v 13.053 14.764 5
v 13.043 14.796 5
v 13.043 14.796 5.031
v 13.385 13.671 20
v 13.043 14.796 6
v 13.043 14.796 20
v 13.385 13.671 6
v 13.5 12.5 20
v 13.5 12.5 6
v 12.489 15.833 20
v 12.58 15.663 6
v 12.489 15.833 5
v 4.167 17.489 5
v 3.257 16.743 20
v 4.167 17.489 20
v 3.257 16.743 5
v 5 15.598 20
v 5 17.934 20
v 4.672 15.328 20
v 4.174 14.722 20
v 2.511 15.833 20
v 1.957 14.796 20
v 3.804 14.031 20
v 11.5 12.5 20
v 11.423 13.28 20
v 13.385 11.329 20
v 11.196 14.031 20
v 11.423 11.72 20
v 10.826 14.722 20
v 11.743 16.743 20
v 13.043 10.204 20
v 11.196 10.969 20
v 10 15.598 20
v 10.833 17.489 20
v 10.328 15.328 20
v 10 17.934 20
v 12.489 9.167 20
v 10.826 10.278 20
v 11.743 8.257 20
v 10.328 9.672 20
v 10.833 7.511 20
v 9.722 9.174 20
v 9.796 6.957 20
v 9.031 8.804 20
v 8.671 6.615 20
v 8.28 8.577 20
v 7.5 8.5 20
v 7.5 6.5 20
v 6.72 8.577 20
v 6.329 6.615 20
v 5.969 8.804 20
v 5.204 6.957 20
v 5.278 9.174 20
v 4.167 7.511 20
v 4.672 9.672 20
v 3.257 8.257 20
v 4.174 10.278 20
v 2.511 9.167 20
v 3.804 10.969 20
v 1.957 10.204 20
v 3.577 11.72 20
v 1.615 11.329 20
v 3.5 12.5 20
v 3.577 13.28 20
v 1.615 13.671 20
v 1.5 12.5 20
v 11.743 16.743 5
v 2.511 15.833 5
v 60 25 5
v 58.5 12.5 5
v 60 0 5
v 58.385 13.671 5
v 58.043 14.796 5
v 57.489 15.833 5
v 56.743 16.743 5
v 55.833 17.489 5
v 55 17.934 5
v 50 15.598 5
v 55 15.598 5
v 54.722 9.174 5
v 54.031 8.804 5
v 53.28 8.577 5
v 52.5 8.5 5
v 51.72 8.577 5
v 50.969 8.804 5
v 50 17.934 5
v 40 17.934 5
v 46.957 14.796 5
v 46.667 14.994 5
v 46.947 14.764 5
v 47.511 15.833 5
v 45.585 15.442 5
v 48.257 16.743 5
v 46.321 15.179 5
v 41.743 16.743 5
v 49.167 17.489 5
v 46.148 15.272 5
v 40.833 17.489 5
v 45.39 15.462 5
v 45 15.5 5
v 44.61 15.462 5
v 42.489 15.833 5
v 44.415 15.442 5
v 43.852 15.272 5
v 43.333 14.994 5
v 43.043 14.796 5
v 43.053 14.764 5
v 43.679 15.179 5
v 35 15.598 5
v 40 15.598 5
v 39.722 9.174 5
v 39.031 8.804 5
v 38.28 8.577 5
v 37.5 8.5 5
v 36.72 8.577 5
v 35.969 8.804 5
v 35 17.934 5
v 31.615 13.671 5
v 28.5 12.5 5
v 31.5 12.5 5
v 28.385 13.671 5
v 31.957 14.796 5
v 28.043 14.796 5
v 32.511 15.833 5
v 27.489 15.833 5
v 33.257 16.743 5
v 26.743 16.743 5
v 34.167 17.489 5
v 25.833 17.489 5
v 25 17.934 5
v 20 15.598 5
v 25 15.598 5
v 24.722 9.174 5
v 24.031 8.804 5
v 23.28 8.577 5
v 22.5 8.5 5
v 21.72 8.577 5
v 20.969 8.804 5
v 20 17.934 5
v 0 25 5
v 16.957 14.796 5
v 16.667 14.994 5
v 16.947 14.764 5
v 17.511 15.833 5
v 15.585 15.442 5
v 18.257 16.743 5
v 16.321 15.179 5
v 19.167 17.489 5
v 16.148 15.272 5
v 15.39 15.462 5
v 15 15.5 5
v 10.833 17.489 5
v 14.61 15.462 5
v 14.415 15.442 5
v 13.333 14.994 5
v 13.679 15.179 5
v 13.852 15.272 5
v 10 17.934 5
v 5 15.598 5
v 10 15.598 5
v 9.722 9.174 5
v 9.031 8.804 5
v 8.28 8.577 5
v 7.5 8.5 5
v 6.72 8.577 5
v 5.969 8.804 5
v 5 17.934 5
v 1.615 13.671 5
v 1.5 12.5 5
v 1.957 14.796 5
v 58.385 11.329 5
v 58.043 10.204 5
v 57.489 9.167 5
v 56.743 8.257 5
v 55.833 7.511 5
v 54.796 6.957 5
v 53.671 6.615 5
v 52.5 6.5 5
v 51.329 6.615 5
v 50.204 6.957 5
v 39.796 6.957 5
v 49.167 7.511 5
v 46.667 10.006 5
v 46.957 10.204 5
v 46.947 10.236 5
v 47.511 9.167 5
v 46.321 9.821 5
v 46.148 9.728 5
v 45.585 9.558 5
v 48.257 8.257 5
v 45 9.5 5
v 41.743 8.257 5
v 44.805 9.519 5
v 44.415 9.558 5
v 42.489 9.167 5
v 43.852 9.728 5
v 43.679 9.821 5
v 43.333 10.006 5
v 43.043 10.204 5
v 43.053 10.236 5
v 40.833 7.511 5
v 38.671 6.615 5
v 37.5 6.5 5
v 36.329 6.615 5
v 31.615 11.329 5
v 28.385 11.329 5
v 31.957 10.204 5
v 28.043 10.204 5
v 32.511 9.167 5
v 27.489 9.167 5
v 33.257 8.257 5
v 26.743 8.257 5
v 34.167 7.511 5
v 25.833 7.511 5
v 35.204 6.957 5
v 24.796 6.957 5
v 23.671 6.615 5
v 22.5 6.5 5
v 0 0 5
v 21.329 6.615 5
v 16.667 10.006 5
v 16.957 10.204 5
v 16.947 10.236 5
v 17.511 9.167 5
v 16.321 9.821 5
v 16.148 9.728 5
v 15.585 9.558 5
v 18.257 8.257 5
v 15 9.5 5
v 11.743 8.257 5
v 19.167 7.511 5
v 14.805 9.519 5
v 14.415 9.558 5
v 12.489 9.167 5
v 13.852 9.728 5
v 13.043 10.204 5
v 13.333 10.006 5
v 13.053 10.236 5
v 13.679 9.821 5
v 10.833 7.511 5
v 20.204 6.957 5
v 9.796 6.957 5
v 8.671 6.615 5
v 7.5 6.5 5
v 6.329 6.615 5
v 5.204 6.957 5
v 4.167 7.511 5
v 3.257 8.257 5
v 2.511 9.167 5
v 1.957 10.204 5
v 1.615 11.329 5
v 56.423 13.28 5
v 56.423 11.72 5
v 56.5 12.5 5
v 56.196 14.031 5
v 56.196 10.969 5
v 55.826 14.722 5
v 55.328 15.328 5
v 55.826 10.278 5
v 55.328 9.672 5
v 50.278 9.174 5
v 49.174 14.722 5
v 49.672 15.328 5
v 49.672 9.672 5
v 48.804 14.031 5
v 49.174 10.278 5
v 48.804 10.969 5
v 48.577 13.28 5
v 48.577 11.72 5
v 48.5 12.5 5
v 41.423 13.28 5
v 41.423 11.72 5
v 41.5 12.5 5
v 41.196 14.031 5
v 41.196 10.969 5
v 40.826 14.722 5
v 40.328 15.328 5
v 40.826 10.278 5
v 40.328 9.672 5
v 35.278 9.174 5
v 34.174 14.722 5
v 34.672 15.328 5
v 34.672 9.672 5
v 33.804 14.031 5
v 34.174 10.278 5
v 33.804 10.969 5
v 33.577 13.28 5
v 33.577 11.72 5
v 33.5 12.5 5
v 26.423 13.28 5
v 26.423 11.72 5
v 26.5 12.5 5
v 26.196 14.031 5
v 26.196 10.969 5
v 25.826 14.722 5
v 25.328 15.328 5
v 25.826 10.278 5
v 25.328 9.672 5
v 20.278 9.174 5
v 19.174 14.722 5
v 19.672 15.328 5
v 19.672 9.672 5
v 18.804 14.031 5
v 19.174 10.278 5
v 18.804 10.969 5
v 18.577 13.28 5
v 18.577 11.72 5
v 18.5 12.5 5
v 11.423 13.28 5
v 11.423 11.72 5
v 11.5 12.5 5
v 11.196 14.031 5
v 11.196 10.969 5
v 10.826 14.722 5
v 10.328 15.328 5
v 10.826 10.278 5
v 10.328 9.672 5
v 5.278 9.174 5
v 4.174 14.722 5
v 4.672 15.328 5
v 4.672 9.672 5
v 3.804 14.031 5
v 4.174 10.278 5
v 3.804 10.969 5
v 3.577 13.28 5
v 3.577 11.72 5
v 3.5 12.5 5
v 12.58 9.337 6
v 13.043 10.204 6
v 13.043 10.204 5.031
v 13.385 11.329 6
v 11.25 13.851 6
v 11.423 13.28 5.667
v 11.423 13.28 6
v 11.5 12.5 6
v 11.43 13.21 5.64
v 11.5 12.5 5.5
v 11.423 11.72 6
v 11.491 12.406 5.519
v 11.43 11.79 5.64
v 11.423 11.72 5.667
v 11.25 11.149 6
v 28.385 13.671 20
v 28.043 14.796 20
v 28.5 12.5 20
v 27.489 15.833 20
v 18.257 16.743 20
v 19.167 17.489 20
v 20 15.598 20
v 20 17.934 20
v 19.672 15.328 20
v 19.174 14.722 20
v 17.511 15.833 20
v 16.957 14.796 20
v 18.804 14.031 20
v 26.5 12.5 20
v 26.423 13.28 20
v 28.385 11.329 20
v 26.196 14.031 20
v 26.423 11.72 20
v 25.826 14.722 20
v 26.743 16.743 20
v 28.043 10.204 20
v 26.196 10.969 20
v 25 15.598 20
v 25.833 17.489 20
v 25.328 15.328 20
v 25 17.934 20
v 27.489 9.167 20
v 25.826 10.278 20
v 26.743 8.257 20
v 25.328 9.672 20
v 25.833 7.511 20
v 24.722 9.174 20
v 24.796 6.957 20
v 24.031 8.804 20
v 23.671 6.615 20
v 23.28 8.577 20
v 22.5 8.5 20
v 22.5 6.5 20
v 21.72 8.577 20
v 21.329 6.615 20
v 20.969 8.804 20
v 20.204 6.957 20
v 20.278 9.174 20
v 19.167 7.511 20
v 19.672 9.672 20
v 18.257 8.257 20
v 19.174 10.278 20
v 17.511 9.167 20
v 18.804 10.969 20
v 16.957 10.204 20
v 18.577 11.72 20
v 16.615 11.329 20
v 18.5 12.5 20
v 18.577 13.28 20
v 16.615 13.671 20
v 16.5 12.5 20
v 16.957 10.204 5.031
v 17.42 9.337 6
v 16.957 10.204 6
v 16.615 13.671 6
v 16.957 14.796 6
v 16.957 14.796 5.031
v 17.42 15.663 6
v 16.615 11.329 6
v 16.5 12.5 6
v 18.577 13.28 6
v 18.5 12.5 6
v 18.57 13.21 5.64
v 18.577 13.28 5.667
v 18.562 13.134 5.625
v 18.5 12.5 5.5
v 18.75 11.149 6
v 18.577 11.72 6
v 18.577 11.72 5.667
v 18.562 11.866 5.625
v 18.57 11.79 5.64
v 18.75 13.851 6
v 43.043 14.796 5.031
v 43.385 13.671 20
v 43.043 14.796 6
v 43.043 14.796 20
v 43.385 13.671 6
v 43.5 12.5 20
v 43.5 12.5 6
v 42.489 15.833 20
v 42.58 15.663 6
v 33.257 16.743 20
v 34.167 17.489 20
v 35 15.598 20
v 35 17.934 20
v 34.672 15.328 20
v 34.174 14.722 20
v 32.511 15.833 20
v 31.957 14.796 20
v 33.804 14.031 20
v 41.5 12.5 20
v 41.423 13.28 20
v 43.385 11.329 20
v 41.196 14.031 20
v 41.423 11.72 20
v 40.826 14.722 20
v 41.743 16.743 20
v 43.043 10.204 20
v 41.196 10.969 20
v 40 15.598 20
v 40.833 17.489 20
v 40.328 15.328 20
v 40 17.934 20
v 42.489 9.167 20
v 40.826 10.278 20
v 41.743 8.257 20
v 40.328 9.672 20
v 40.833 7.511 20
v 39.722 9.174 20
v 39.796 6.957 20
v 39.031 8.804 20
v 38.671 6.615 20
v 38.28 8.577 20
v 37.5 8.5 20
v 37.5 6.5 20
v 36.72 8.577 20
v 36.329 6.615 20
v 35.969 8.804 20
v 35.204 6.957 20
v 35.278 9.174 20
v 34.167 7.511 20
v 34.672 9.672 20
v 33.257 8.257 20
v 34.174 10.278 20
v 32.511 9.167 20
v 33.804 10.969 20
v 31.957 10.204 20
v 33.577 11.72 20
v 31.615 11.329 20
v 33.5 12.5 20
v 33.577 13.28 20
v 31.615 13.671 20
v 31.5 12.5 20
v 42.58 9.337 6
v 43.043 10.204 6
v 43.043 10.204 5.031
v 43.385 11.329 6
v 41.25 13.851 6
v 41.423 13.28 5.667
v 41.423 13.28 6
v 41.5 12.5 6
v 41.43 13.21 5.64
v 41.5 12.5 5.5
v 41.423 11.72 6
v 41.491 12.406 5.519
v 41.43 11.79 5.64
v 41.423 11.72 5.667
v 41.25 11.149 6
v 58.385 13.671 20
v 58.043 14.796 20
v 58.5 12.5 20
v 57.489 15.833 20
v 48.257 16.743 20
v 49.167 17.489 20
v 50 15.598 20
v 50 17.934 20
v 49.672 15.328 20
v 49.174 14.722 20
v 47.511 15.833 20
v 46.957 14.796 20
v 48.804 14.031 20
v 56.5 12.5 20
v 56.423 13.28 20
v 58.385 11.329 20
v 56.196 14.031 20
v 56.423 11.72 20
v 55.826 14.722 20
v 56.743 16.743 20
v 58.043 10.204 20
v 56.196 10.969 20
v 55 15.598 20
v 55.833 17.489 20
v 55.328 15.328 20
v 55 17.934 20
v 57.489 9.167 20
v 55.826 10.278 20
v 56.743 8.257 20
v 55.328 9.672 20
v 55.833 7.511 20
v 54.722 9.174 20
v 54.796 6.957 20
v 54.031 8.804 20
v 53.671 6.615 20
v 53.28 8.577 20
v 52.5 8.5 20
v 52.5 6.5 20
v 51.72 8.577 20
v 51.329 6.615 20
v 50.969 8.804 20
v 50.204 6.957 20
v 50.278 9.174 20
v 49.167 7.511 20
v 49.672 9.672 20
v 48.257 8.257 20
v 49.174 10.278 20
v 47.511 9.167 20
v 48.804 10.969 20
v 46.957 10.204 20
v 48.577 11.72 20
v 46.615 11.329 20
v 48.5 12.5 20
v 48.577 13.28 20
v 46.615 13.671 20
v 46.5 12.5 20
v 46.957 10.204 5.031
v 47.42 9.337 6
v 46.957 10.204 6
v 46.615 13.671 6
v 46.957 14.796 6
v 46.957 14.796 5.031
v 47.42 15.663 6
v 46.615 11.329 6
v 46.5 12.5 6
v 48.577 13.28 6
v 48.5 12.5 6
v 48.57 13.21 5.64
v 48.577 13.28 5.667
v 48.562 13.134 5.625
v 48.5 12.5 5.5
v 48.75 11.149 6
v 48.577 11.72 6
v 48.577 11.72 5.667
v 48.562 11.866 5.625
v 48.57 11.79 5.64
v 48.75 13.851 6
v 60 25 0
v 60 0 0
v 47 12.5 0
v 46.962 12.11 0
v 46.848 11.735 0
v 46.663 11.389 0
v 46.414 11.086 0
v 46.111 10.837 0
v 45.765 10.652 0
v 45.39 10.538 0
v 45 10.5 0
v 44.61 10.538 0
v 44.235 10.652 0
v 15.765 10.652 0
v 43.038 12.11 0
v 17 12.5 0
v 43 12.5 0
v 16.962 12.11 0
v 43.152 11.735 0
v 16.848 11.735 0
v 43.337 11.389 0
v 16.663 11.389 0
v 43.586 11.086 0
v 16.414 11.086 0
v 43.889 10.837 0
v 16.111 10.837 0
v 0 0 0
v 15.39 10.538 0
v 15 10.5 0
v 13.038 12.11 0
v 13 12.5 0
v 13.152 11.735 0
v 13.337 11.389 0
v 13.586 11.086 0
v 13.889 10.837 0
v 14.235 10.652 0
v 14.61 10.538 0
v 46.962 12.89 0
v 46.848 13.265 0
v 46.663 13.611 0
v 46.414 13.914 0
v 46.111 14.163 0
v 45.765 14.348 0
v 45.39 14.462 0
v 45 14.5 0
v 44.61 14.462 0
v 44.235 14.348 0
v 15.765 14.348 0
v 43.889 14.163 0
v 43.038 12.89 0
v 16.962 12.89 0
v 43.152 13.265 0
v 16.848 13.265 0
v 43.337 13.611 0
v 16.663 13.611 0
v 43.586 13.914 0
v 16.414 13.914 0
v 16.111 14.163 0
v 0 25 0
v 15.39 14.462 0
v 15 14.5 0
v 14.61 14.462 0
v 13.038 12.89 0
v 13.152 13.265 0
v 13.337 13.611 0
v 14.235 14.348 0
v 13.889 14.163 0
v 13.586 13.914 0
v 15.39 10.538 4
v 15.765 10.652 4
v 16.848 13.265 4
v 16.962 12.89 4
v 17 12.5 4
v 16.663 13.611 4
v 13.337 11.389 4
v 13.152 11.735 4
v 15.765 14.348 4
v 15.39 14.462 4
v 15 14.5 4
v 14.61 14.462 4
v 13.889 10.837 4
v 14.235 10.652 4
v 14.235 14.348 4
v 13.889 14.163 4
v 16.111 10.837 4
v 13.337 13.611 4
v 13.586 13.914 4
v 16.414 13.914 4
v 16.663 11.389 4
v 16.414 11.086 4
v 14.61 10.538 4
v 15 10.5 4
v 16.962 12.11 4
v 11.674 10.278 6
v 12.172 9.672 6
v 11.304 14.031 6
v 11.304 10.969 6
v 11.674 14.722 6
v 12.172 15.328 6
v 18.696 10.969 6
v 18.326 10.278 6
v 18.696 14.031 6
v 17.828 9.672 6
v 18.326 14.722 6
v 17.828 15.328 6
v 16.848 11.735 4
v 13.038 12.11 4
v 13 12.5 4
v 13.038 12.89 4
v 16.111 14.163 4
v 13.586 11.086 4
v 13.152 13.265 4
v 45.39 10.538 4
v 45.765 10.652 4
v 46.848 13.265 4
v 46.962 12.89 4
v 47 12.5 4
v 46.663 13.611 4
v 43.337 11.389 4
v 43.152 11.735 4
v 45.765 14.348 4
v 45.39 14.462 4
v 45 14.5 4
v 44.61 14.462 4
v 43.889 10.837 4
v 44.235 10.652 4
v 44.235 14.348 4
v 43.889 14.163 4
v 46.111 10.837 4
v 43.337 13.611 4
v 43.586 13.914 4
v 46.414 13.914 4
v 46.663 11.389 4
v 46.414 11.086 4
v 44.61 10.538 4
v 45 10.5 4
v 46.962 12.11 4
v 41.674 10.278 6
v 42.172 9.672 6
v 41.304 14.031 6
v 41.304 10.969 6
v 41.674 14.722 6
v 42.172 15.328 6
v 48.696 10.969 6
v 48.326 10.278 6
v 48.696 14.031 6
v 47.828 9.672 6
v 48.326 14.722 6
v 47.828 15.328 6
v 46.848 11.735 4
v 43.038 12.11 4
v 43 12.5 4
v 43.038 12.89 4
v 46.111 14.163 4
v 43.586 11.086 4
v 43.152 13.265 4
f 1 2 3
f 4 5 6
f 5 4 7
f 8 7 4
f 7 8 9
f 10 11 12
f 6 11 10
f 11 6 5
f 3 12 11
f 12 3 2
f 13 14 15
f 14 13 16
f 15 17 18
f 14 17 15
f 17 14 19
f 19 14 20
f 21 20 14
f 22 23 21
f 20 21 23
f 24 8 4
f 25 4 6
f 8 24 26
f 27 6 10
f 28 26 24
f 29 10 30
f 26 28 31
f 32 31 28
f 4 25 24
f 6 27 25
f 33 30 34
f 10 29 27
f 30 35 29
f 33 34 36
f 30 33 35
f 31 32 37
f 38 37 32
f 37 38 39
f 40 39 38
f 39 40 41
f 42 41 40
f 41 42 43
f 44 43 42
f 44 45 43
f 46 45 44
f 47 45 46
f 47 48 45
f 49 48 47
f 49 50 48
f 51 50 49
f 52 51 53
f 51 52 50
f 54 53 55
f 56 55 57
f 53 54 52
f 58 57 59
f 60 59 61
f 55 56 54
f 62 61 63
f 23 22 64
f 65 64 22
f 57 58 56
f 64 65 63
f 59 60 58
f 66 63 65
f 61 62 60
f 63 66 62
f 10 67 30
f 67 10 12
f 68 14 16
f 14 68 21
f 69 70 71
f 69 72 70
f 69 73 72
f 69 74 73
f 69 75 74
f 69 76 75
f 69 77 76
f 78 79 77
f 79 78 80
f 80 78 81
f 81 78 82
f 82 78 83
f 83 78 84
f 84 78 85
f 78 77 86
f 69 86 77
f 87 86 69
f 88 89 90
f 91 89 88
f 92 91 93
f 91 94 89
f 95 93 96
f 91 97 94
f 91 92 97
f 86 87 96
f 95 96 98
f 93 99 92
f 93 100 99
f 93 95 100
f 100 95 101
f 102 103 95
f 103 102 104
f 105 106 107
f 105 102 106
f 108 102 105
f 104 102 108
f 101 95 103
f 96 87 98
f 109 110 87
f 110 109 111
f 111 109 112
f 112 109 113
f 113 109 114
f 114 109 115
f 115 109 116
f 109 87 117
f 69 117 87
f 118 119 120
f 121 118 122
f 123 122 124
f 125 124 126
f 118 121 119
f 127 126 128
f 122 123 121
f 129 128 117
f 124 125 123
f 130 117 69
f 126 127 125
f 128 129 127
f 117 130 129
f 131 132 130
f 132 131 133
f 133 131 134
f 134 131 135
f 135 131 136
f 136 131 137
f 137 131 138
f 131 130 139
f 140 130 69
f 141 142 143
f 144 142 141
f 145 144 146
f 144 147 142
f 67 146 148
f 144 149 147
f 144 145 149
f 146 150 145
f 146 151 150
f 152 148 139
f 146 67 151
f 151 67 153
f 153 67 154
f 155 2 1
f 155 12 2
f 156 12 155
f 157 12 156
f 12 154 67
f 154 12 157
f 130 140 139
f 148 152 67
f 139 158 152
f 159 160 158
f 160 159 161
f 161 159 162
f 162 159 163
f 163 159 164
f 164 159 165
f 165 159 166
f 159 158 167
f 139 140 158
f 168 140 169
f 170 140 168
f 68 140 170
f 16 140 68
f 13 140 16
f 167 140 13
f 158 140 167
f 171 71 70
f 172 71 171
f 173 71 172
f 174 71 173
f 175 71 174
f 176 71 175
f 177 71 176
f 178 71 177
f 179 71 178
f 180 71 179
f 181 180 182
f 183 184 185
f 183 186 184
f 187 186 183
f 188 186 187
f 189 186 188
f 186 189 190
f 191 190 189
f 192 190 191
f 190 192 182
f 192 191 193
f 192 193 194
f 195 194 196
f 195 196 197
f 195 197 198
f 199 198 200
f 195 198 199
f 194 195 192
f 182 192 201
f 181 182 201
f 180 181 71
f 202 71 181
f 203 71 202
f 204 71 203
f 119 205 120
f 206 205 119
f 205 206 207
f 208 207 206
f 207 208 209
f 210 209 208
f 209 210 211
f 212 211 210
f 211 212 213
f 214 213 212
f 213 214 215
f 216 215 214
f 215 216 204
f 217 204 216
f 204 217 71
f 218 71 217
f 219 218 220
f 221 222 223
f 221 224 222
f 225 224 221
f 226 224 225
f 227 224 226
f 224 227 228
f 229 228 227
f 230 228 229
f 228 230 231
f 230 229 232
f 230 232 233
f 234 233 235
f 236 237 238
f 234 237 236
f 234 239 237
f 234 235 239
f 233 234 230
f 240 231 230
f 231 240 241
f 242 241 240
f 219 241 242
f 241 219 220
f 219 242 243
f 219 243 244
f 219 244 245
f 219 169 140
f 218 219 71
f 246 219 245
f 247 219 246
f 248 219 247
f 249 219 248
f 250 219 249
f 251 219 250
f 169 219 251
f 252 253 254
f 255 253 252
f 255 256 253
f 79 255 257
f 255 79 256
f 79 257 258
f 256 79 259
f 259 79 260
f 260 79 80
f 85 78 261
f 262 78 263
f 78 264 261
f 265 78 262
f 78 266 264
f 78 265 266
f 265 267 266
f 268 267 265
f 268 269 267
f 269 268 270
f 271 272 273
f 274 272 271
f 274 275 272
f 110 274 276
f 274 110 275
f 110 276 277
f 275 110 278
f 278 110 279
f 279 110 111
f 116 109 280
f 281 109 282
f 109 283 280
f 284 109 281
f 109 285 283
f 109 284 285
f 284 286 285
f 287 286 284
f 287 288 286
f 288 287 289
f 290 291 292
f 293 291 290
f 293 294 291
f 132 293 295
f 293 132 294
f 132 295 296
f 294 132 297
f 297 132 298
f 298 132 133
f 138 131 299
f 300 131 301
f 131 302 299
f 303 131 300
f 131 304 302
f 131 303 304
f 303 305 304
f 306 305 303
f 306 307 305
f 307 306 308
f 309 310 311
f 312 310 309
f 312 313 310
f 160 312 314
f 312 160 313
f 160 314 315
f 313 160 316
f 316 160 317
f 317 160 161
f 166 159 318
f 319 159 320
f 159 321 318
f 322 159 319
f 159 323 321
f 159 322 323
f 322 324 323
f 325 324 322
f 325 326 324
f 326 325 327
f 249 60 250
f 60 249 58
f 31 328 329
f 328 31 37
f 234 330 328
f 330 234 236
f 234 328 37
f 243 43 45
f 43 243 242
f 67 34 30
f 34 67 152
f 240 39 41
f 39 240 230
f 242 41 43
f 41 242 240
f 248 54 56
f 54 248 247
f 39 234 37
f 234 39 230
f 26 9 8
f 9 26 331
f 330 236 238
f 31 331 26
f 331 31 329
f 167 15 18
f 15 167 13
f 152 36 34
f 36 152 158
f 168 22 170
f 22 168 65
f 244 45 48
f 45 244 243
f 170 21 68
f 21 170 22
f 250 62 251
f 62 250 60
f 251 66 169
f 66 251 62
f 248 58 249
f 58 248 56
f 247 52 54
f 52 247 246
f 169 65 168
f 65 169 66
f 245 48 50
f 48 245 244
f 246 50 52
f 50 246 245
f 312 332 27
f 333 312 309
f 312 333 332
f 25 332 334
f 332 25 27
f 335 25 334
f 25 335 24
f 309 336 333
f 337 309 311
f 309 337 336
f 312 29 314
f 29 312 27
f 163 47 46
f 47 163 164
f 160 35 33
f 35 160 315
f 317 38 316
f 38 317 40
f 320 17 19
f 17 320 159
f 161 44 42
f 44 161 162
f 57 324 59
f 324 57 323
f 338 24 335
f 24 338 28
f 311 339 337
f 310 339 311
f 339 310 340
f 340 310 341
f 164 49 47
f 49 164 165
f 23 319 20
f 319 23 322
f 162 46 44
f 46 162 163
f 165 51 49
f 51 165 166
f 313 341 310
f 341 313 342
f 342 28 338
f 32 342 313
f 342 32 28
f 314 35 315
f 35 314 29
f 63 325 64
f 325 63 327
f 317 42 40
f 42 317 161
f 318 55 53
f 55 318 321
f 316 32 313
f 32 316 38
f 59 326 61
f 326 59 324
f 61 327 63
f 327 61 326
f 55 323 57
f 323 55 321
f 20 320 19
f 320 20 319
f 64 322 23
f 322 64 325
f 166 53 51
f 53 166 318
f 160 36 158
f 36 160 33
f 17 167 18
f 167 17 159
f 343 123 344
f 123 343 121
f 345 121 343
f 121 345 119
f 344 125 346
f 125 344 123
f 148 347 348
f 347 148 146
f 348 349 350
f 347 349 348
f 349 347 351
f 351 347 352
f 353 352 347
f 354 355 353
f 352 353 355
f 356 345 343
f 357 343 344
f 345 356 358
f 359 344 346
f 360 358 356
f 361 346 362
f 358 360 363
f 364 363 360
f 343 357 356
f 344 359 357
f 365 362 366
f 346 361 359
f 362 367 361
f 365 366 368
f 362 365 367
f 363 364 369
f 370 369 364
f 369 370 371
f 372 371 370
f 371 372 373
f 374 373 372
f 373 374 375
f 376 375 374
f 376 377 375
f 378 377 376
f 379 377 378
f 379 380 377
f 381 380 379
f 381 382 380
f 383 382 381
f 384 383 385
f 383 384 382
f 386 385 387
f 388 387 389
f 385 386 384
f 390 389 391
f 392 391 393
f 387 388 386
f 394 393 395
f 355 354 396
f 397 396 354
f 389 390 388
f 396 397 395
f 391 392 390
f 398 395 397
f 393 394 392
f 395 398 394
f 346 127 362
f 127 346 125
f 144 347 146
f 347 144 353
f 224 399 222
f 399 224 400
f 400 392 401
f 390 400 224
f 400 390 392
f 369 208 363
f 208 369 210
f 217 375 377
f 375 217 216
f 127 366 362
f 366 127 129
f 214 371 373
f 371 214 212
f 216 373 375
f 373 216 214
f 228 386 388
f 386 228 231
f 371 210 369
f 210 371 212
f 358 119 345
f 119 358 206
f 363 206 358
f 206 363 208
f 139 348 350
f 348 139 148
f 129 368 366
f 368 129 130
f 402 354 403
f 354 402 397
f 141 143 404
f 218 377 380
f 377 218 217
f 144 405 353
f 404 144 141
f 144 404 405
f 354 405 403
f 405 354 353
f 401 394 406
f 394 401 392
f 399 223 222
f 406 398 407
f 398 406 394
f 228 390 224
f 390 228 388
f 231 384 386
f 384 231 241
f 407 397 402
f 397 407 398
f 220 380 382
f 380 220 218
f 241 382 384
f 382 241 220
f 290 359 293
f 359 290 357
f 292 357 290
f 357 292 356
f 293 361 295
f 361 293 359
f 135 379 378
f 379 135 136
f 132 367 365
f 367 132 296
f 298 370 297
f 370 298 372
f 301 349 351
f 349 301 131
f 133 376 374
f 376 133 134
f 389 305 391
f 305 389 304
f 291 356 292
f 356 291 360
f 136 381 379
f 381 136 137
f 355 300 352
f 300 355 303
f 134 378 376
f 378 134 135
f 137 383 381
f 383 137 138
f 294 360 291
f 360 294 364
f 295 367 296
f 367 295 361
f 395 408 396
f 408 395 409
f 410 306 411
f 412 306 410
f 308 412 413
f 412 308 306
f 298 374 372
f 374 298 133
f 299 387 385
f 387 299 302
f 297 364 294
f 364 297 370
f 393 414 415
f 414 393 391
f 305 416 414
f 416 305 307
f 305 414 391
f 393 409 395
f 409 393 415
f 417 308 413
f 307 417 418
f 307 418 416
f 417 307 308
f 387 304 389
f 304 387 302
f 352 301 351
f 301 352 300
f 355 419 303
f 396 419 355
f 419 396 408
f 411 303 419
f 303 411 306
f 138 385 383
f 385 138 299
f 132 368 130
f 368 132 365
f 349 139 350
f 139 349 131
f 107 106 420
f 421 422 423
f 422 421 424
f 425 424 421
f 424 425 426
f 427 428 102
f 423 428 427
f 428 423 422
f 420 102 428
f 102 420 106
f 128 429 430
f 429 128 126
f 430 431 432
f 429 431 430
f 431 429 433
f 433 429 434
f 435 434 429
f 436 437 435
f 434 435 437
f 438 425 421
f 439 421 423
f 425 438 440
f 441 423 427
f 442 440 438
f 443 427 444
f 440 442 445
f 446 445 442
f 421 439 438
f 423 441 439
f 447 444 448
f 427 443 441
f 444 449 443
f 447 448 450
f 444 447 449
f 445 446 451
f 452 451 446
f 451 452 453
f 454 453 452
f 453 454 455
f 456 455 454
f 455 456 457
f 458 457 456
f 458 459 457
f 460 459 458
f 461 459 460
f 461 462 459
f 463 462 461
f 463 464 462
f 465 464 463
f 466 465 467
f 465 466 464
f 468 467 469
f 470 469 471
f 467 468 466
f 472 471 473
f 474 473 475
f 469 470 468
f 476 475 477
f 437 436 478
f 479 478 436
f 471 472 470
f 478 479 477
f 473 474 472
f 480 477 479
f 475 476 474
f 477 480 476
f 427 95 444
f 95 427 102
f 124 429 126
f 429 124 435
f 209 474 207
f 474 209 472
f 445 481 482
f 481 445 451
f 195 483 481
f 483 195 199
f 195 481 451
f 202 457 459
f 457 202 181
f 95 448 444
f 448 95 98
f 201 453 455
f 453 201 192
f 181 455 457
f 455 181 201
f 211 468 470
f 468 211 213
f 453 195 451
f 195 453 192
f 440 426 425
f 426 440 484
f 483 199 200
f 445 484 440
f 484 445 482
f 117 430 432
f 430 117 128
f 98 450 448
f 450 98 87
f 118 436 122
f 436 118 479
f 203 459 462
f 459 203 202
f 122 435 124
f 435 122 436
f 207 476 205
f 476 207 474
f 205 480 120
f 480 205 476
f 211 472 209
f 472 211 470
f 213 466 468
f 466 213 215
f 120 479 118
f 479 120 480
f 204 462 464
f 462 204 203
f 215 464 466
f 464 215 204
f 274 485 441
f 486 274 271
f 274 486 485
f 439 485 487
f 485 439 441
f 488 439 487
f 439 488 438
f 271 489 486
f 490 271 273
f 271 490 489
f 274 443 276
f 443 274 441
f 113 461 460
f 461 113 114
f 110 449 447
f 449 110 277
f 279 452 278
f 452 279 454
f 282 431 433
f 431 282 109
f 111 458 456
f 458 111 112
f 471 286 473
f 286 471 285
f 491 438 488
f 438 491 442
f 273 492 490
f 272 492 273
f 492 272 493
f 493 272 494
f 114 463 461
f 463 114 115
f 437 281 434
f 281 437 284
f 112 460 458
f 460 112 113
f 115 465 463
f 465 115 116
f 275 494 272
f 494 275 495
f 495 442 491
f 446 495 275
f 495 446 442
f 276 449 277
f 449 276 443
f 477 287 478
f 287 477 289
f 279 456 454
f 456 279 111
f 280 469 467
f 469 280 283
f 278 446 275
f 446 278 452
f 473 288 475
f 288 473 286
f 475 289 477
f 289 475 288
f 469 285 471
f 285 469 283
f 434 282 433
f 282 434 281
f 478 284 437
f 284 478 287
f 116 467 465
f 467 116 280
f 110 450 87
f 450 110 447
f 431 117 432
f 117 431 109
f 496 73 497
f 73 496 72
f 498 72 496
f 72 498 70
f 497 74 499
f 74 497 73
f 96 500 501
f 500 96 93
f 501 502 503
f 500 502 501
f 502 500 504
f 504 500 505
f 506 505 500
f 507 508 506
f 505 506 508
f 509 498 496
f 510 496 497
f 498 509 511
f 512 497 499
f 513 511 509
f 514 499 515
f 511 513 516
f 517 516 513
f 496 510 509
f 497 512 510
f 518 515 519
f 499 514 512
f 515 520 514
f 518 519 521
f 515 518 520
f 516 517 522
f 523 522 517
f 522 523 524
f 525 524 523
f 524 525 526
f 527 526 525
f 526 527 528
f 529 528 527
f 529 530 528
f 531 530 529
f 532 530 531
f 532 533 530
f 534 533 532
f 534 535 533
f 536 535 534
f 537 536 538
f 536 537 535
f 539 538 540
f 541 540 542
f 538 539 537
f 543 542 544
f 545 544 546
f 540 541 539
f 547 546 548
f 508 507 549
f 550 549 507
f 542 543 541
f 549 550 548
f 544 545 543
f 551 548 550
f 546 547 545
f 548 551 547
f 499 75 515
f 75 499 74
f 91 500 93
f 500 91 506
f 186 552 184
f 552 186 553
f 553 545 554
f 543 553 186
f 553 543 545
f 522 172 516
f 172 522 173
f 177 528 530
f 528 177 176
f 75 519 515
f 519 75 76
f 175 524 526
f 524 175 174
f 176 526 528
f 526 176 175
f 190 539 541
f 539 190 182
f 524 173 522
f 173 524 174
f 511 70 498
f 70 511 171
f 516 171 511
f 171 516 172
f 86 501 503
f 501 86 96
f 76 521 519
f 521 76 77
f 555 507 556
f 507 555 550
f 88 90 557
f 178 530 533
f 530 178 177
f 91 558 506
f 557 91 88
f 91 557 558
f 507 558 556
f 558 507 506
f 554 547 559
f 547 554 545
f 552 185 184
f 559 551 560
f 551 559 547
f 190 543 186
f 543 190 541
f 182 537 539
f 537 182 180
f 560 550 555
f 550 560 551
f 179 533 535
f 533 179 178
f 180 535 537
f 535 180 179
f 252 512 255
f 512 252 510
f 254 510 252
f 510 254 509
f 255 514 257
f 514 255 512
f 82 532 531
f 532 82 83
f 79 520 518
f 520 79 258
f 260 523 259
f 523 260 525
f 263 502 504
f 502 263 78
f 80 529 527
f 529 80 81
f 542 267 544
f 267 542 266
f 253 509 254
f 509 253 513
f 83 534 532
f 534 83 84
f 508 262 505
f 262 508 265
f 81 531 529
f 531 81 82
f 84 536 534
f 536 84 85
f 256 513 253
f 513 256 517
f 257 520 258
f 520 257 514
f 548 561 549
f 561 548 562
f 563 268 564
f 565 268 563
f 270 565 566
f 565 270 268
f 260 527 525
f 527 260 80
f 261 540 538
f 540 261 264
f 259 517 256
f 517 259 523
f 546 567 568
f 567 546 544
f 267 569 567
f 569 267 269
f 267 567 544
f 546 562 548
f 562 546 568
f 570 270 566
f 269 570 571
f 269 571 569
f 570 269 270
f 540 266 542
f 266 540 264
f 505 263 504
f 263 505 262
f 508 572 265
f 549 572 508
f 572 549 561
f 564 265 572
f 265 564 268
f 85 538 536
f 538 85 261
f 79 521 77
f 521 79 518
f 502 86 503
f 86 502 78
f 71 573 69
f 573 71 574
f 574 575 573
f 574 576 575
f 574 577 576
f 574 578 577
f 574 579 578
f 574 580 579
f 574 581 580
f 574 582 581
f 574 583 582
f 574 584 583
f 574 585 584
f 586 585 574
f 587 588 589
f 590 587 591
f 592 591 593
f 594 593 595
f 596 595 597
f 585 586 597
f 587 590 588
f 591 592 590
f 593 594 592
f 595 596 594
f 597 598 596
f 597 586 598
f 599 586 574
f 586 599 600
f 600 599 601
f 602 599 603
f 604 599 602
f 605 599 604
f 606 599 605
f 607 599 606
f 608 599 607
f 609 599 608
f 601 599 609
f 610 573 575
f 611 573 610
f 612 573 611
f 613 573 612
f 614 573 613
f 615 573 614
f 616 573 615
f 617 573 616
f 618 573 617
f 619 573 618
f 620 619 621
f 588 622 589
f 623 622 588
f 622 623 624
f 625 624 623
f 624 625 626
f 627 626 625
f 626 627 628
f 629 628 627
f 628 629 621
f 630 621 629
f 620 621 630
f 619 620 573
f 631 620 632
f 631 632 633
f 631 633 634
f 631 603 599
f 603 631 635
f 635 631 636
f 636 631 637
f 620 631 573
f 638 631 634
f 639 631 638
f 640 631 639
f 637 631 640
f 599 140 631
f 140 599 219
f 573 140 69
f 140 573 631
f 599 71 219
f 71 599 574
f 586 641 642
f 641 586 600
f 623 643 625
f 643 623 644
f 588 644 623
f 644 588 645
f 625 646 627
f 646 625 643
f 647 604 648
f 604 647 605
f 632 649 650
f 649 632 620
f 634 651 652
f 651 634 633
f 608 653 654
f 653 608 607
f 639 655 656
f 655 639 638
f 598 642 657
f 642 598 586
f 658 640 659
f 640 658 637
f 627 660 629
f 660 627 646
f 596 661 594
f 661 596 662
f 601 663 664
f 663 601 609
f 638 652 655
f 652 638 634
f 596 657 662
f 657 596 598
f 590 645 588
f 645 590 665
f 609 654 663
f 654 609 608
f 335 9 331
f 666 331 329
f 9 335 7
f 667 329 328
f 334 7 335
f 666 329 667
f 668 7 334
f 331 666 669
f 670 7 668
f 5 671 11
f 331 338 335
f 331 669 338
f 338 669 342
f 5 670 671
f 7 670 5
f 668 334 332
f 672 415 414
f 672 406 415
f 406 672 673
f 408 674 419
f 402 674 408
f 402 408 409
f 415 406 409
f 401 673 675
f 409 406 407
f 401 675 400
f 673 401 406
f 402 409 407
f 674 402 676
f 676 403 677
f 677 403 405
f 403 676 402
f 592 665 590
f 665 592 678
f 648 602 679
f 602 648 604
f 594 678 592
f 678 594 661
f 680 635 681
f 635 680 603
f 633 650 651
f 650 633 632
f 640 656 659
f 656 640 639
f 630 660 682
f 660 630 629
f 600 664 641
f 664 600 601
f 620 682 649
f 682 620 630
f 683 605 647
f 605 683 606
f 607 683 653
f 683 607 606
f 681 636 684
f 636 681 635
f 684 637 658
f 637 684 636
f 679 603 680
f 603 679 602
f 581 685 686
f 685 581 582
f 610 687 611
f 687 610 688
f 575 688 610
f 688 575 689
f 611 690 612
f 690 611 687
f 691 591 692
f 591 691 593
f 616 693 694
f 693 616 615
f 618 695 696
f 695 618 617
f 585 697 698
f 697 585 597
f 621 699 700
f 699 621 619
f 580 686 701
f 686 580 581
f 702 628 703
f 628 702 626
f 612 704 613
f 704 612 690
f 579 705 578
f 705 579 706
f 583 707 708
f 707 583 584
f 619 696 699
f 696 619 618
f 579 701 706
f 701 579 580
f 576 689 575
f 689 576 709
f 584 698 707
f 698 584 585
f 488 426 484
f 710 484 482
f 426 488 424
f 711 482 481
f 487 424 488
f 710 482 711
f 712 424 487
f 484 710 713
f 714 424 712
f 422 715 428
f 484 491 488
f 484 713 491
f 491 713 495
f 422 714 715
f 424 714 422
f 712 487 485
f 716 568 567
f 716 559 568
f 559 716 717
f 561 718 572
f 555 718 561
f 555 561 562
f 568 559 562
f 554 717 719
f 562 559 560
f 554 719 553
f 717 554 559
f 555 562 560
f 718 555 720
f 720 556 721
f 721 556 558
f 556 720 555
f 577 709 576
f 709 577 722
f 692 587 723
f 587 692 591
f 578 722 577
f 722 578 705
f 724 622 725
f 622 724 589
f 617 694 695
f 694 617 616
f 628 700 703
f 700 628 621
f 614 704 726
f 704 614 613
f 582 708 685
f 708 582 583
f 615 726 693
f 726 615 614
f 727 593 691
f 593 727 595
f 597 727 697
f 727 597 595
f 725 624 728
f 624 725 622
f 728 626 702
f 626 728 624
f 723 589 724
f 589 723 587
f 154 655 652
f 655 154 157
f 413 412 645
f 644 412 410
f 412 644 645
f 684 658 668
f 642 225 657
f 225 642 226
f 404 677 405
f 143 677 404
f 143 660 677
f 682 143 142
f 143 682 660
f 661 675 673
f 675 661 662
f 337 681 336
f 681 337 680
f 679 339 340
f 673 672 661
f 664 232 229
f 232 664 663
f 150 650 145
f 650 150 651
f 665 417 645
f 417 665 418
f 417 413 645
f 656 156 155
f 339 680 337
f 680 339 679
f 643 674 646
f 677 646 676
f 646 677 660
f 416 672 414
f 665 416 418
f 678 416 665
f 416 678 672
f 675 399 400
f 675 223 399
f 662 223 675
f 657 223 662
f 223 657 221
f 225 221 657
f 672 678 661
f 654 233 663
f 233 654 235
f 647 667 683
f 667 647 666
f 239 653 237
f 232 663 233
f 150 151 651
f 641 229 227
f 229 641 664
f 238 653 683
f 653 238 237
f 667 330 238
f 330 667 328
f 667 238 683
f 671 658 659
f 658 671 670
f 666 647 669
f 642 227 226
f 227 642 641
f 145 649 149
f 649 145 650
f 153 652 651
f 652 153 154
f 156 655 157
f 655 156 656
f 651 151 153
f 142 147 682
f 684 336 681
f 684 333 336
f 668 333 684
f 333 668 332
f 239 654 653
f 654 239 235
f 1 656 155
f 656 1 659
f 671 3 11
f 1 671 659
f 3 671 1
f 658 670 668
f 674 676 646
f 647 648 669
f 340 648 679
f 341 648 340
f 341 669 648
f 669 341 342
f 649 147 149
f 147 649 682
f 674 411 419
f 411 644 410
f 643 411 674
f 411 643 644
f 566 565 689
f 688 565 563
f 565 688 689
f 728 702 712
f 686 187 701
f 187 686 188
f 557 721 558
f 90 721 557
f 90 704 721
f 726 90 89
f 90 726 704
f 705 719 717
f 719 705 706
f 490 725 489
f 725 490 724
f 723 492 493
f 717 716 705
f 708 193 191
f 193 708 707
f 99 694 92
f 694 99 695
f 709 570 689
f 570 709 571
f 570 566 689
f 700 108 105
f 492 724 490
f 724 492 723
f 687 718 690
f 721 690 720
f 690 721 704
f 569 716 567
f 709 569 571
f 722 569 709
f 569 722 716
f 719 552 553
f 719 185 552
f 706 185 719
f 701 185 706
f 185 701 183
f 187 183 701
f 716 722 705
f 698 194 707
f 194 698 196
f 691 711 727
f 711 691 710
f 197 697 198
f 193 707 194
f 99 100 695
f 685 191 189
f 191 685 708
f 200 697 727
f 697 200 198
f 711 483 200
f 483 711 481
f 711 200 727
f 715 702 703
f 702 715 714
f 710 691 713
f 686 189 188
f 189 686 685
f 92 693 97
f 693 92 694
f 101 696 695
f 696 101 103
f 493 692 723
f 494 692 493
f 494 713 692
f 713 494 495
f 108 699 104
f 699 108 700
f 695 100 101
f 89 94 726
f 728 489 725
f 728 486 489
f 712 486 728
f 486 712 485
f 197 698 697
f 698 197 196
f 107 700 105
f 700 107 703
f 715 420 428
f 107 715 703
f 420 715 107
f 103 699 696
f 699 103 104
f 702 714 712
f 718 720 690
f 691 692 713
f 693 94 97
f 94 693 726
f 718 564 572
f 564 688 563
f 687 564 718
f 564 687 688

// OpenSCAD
// Parametric cable organizer/clip
// Flexible slots to hold various cable sizes

base_length = 60;
base_width = 25;
base_height = 5;
num_slots = 4;
slot_diameter = 8;
slot_opening = 5;  // Opening width (less than diameter for grip)
slot_depth = 15;
wall_thickness = 2;
mounting_hole_diameter = 4;

$fn = 32;

module cable_slot() {
    difference() {
        // Outer cylinder
        cylinder(d=slot_diameter + wall_thickness*2, h=slot_depth);
        
        // Inner channel
        translate([0, 0, -1])
        cylinder(d=slot_diameter, h=slot_depth + 2);
        
        // Entry slot (narrower than cable for grip)
        translate([-slot_opening/2, 0, -1])
        cube([slot_opening, slot_diameter, slot_depth + 2]);
    }
}

module cable_organizer() {
    slot_spacing = base_length / num_slots;
    
    difference() {
        union() {
            // Base plate
            cube([base_length, base_width, base_height]);
            
            // Cable slots
            for (i = [0:num_slots-1]) {
                translate([slot_spacing/2 + i*slot_spacing, base_width/2, base_height])
                cable_slot();
            }
        }
        
        // Mounting holes in base
        translate([base_length/4, base_width/2, -1])
        cylinder(d=mounting_hole_diameter, h=base_height + 2);
        
        translate([3*base_length/4, base_width/2, -1])
        cylinder(d=mounting_hole_diameter, h=base_height + 2);
        
        // Countersinks
        translate([base_length/4, base_width/2, base_height - 1])
        cylinder(d1=mounting_hole_diameter, d2=mounting_hole_diameter*2, h=2);
        
        translate([3*base_length/4, base_width/2, base_height - 1])
        cylinder(d1=mounting_hole_diameter, d2=mounting_hole_diameter*2, h=2);
    }
}

cable_organizer();
